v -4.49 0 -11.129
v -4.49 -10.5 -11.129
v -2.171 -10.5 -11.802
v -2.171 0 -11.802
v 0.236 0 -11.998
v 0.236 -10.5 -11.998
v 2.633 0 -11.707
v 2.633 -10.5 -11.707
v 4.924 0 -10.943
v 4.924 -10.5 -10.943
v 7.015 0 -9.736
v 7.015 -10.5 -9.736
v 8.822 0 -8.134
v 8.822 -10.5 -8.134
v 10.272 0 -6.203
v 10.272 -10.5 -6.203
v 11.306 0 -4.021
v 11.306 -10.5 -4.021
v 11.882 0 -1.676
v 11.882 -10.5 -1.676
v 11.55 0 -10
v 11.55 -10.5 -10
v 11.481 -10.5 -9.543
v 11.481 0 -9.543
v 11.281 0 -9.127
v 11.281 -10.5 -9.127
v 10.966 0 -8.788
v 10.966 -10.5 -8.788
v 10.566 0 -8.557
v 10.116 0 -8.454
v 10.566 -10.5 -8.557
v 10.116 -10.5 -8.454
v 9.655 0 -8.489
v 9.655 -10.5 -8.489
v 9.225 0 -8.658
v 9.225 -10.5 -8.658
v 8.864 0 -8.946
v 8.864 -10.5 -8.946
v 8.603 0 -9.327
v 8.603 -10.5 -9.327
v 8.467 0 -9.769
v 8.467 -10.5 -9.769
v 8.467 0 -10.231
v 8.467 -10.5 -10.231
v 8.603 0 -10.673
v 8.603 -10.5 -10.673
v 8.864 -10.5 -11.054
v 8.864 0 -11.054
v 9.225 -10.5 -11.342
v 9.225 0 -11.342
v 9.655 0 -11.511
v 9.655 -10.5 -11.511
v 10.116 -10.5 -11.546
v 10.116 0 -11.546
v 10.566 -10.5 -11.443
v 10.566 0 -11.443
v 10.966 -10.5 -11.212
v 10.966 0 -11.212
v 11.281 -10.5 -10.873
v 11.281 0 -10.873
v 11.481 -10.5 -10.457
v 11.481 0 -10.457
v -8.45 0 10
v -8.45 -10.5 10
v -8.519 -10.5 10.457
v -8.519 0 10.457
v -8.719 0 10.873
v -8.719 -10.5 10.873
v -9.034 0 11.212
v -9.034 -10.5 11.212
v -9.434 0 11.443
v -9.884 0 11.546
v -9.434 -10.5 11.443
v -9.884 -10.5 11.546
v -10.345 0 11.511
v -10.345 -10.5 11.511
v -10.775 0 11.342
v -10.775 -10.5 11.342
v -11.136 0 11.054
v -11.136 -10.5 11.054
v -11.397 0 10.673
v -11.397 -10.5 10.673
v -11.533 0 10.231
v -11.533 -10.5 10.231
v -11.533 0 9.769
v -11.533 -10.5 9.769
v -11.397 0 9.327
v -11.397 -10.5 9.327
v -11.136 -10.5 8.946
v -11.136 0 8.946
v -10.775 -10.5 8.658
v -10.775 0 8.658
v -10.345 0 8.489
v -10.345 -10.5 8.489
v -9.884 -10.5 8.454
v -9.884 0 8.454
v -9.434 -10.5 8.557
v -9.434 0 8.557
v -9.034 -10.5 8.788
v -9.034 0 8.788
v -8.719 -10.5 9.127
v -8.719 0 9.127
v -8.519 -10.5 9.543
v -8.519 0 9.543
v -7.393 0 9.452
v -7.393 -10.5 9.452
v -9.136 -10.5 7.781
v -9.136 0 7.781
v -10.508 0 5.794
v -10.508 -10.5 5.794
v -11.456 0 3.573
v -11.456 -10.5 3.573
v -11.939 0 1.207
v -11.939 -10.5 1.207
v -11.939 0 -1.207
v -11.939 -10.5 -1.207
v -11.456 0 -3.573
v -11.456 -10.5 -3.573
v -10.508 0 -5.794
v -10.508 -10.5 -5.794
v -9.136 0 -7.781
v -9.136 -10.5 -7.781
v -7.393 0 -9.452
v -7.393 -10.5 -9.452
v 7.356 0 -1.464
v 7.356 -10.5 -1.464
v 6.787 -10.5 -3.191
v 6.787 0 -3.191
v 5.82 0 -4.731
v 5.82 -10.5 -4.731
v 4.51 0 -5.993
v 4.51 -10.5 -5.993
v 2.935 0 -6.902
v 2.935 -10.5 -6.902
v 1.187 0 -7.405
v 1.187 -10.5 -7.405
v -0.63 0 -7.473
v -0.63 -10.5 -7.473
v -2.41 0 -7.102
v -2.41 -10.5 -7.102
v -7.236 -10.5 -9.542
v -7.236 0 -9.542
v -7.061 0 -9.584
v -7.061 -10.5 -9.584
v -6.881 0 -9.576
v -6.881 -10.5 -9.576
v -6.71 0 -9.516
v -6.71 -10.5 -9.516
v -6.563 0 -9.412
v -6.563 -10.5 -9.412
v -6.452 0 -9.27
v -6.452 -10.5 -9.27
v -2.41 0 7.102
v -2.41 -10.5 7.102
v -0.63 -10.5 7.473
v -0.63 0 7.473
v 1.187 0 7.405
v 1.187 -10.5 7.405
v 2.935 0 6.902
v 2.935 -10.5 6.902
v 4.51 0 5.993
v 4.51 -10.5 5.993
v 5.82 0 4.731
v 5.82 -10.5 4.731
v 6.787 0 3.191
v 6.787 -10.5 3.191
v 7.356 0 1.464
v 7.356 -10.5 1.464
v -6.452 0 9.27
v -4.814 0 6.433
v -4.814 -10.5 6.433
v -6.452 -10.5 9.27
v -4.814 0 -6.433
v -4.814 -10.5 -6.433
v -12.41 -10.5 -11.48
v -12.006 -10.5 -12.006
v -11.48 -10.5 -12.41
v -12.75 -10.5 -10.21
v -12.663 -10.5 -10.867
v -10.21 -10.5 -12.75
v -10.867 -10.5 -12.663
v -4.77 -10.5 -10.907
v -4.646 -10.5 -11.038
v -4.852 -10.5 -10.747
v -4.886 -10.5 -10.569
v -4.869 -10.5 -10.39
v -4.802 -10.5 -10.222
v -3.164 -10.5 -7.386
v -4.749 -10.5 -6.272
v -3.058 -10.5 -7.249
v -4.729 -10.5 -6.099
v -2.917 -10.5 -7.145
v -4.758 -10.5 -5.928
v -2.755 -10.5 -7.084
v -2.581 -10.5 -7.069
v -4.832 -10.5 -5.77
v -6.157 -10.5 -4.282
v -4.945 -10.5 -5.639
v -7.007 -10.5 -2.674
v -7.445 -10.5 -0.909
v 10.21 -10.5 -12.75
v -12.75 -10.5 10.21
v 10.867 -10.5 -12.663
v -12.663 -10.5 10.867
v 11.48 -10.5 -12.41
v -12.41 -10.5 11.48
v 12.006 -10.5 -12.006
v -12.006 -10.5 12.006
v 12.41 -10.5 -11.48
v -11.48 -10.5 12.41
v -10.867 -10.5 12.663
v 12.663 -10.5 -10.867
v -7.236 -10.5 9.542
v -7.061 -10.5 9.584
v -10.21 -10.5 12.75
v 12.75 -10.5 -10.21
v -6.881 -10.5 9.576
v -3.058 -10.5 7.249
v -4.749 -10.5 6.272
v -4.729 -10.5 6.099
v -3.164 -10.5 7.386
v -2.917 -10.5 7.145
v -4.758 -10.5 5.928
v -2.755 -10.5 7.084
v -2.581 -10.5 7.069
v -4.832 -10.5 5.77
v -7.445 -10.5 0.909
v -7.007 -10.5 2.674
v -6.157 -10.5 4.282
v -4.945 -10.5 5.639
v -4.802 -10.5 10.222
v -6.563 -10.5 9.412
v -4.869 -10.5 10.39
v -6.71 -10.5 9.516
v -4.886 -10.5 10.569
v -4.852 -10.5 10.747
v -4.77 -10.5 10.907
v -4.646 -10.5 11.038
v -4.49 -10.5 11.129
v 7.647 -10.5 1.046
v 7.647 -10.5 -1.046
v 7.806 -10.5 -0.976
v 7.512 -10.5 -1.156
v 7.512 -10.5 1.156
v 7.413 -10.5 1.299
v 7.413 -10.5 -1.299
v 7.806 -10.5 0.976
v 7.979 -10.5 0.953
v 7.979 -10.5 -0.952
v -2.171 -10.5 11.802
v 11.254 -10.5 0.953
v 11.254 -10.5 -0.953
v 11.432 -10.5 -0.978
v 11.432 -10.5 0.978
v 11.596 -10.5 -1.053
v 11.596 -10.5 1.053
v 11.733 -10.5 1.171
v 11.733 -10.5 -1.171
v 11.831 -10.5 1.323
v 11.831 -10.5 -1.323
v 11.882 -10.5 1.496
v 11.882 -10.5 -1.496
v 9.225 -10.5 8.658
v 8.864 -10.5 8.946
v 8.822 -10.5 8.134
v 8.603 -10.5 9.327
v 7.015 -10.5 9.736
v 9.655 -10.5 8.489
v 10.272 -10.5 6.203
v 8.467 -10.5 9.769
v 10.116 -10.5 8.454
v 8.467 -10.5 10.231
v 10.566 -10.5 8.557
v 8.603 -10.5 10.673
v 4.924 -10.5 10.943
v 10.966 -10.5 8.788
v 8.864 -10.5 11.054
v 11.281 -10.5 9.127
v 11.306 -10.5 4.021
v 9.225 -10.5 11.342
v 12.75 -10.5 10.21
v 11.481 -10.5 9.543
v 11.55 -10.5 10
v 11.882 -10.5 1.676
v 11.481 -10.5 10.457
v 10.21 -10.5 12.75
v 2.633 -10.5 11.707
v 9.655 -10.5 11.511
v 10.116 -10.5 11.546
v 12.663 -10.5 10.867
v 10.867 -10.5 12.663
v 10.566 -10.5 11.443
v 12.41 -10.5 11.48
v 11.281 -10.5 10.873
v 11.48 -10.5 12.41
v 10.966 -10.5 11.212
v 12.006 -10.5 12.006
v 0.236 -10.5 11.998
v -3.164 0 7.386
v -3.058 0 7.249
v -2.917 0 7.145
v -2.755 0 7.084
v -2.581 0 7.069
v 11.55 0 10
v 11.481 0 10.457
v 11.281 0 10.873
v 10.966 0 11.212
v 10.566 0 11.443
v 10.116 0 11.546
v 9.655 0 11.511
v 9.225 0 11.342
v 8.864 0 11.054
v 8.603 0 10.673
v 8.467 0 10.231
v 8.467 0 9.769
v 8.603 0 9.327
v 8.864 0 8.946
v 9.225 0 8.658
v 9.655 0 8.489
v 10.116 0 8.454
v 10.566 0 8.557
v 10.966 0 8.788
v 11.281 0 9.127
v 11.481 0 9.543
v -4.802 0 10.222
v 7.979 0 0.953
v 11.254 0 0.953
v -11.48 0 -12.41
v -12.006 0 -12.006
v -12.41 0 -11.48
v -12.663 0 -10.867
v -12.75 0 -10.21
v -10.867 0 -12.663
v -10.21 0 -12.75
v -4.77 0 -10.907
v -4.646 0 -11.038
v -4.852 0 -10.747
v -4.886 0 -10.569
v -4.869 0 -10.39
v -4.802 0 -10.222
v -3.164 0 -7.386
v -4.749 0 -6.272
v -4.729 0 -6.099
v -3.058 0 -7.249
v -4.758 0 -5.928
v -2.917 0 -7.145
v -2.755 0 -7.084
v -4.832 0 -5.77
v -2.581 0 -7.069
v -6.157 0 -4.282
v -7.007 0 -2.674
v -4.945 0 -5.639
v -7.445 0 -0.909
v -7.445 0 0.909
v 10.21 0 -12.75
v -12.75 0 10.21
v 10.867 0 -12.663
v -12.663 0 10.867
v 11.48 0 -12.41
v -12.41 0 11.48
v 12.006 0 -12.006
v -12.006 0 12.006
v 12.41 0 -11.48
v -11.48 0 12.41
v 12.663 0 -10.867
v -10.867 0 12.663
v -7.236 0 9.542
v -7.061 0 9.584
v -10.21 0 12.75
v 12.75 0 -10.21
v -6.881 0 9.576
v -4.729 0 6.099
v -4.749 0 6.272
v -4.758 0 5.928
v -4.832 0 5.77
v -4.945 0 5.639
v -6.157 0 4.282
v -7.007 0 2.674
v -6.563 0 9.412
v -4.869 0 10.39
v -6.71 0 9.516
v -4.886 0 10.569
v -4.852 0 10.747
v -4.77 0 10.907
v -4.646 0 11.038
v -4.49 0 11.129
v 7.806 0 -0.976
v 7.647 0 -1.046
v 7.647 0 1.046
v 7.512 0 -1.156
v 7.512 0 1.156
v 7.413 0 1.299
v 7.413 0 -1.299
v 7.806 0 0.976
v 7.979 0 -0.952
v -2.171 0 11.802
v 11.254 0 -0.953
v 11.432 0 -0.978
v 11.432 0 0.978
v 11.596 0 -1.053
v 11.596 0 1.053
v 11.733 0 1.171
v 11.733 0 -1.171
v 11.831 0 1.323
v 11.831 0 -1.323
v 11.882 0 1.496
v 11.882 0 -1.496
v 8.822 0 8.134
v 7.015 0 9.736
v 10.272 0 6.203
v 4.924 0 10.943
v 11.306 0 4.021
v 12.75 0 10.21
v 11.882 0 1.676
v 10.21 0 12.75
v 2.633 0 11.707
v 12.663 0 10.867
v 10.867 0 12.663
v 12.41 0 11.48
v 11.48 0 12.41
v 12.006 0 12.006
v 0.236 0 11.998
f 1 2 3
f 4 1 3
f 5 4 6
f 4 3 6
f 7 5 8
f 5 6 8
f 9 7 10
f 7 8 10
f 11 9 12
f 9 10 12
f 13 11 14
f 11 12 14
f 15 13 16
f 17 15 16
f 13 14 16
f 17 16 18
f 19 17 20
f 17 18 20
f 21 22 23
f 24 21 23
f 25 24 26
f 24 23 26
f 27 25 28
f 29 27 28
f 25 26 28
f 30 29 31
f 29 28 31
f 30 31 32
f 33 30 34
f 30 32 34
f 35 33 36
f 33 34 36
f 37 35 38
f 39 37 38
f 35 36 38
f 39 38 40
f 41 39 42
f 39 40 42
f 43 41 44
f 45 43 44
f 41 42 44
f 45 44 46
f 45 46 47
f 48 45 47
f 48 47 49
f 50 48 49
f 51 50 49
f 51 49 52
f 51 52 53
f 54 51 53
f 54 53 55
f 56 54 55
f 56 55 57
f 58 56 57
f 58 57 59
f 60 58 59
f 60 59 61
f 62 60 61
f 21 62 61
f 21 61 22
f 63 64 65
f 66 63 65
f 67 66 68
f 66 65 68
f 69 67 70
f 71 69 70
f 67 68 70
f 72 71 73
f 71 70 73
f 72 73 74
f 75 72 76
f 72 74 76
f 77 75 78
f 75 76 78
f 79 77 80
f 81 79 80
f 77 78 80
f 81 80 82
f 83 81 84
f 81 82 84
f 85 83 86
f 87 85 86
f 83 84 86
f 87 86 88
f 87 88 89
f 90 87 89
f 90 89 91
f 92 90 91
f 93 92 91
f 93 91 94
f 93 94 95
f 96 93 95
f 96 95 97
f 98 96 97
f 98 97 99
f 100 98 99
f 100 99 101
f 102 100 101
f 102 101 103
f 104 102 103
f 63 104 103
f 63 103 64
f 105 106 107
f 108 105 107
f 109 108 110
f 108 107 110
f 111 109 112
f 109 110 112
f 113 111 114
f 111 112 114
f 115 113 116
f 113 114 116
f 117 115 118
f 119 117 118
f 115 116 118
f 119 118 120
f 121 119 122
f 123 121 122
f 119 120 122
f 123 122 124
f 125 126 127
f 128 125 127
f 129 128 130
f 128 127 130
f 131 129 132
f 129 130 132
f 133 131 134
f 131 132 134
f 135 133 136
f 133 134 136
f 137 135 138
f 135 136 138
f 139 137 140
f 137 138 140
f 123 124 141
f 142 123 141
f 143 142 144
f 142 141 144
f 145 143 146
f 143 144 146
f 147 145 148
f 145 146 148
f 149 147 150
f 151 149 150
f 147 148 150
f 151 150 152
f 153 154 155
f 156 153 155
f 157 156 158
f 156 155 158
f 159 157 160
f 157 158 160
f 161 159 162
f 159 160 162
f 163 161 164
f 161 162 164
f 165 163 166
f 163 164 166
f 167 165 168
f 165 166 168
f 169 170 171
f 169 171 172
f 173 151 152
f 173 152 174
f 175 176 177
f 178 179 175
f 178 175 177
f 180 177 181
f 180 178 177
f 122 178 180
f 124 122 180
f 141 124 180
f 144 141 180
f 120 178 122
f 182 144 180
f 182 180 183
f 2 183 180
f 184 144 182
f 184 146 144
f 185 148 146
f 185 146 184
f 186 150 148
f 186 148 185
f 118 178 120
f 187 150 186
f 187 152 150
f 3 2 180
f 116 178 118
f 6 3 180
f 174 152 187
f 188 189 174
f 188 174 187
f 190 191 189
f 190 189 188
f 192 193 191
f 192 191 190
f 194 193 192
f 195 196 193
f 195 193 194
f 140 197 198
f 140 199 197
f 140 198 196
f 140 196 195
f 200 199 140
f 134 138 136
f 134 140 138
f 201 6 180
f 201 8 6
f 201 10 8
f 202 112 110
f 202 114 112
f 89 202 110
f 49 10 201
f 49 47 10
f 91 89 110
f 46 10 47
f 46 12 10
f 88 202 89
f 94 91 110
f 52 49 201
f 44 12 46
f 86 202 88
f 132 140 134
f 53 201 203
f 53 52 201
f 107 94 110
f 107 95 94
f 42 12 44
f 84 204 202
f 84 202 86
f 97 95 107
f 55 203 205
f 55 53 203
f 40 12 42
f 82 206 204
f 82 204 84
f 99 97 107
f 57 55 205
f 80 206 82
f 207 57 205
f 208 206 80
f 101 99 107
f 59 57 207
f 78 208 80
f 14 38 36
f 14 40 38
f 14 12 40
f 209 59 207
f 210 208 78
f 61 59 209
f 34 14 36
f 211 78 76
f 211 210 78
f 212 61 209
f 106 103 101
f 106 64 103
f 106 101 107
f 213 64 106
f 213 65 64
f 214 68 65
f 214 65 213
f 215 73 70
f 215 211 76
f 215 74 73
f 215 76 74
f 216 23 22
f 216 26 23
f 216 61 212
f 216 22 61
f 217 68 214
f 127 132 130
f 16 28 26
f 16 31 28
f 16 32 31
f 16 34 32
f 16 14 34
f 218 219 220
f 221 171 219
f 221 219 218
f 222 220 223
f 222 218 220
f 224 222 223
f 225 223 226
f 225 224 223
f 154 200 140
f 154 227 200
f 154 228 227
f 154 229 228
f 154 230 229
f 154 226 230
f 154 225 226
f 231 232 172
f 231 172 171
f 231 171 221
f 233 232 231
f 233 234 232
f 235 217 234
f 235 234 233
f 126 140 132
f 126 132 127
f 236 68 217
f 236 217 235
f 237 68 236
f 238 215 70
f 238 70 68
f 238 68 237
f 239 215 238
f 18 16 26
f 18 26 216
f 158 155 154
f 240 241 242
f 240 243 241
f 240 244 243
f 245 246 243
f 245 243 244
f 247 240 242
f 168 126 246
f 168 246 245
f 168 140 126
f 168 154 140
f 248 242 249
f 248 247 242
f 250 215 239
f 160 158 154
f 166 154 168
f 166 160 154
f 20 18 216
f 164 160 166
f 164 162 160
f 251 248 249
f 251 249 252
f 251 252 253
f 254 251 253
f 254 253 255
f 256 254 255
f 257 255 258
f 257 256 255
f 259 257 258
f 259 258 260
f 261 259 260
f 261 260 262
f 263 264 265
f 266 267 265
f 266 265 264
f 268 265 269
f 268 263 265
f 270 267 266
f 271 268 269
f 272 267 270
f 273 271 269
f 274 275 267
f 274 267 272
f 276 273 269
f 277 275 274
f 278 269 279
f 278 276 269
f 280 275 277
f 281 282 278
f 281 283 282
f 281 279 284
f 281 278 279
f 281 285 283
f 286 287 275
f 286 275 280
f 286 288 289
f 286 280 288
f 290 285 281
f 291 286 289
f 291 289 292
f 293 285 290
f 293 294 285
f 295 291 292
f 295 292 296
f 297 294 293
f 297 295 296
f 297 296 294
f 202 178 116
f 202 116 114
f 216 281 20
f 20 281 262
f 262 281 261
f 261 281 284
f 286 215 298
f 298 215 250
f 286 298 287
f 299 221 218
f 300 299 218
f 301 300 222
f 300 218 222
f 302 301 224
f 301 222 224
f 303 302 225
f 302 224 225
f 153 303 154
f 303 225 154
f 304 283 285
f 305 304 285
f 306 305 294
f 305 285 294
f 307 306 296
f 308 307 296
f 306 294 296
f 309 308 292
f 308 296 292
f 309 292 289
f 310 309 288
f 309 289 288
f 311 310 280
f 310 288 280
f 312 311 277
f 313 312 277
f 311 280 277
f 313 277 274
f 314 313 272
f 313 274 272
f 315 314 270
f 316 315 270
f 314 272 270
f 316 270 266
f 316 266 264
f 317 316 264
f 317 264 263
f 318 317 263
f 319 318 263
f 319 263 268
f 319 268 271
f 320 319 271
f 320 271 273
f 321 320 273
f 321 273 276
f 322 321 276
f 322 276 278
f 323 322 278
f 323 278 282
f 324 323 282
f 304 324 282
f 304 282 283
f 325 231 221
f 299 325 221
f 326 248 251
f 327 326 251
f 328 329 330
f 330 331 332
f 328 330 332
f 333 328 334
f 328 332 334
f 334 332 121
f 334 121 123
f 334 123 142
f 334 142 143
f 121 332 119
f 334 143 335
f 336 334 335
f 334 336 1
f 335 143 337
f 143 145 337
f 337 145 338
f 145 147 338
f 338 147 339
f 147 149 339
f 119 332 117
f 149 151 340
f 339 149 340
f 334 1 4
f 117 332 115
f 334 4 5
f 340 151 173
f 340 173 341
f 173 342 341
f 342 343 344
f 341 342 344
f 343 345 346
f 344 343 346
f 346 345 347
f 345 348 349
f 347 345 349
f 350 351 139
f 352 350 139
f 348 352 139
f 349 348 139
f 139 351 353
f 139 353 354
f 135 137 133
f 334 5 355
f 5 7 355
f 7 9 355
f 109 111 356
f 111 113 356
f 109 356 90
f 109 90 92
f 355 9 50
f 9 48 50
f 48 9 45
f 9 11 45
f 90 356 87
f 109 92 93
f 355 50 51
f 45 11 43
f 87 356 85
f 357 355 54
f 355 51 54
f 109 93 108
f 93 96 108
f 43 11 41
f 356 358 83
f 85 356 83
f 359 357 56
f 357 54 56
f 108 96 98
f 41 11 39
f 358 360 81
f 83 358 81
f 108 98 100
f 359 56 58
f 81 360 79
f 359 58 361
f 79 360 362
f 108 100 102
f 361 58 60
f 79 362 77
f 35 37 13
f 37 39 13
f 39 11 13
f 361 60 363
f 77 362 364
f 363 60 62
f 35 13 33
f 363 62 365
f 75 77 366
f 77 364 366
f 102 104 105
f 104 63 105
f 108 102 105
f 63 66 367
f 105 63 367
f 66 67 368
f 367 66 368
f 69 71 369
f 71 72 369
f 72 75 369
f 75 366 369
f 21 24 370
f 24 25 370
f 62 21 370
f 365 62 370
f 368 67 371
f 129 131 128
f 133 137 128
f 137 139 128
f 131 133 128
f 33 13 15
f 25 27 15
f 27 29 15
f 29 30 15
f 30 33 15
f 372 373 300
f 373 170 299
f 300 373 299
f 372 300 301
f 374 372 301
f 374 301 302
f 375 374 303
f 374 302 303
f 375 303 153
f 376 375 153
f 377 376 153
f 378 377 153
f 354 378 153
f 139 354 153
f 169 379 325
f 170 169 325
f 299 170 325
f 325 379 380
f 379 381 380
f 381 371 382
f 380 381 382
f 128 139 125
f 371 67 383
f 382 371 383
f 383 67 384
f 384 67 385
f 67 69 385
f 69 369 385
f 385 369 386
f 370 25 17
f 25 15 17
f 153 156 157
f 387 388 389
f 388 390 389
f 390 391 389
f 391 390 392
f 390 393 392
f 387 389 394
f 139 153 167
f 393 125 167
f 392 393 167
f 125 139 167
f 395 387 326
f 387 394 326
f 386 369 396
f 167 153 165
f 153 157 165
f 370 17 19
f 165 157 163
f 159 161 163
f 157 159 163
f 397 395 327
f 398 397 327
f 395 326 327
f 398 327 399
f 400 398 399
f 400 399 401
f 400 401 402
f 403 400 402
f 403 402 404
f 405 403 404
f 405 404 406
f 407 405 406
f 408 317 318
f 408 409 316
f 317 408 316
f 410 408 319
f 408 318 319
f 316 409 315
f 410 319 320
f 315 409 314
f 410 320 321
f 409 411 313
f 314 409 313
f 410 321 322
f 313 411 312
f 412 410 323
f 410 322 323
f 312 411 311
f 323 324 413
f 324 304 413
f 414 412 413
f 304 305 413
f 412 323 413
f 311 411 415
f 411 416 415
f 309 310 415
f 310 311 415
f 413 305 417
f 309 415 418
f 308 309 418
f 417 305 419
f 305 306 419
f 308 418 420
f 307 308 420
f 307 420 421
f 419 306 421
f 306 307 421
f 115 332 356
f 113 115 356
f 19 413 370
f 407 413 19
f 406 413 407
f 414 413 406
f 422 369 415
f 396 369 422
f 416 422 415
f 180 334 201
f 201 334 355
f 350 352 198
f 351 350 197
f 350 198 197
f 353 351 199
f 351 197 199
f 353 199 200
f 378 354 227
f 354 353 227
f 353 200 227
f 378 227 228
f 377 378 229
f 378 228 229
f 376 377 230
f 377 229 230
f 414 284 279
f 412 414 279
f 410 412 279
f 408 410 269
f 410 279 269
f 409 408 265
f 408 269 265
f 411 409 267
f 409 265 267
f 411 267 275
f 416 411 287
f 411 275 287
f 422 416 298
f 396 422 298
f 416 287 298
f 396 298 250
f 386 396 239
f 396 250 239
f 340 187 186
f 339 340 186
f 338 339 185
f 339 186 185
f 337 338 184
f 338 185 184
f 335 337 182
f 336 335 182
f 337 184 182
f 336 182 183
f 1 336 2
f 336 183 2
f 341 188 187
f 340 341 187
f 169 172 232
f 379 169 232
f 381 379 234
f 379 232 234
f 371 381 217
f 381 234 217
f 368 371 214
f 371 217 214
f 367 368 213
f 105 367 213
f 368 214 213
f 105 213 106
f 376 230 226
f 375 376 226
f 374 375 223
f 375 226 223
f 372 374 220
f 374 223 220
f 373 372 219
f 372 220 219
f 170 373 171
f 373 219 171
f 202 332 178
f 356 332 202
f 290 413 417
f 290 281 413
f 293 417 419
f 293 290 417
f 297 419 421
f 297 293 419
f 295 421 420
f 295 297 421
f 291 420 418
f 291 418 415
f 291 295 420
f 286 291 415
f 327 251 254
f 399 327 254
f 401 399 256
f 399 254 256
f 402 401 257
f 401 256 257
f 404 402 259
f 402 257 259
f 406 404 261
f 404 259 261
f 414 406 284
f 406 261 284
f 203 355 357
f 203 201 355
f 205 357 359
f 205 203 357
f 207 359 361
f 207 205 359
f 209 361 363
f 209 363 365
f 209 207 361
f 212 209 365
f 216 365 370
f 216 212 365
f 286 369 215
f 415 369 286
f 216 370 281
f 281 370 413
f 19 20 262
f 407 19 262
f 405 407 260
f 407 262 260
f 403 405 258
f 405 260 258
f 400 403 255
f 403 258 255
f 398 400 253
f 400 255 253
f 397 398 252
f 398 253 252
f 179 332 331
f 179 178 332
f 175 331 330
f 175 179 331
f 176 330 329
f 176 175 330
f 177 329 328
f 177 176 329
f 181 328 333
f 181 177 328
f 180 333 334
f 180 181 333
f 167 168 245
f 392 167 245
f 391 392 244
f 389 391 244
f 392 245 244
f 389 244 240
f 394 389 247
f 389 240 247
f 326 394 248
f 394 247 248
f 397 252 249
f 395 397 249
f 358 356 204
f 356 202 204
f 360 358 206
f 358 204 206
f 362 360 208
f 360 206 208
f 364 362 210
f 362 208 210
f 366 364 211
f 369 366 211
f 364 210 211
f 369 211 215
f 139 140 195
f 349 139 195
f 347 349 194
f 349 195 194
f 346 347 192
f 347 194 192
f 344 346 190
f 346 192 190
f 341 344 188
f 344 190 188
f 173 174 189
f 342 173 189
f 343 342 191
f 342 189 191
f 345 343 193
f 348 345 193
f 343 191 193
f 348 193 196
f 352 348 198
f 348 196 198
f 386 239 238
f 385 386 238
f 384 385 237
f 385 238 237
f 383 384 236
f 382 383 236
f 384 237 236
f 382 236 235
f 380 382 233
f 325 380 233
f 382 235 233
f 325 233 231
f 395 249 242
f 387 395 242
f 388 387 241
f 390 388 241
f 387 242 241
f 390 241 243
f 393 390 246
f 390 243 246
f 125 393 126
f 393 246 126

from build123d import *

# Parameters (mm, degrees)
F0_W     = 25.5
F0_H     = 25.5
F1_DEPTH = 10.5
F2_R     = 2.54
F3_R     = 1.55
F4_DEPTH = 10.501


with BuildPart() as f1:
    # F0 (on Front) → F1 (new body)
    with BuildSketch(Plane.XZ):
        Rectangle(F0_W, F0_H)
    extrude(amount=F1_DEPTH)

    # F2
    f2_edges = [f1.edges().sort_by_distance(p)[0] for p in [
        (12.75, -5.25, 12.75),
        (-12.75, -5.25, 12.75),
        (12.75, -5.25, -12.75),
        (-12.75, -5.25, -12.75),
    ]]
    fillet(f2_edges, radius=F2_R)

    # F3 (on face) → F4 (cut, through all)
    with BuildSketch(Plane.XZ.offset(10.5)):
        with Locations((-10, 10)):
            Circle(F3_R)
        with Locations((10, 10)):
            Circle(F3_R)
        with Locations((10, -10)):
            Circle(F3_R)
        with BuildLine():
            ThreePointArc((-4.945405, -5.638526), (-7.5, 0), (-4.945405, 5.638526))
            ThreePointArc((-4.945405, 5.638526), (-4.737594, 6.0125), (-4.81419, 6.433421))
            Line((-4.81419, 6.433421), (-6.451679, 9.269636))
            ThreePointArc((-6.451679, 9.269636), (-6.880602, 9.575501), (-7.392808, 9.452322))
            ThreePointArc((-7.392808, 9.452322), (-12, 0), (-7.392808, -9.452322))
            ThreePointArc((-7.392808, -9.452322), (-6.880602, -9.575501), (-6.451679, -9.269636))
            Line((-6.451679, -9.269636), (-4.81419, -6.433421))
            ThreePointArc((-4.81419, -6.433421), (-4.737594, -6.0125), (-4.945405, -5.638526))
        make_face()
        with BuildLine():
            Line((-4.801901, 10.222136), (-3.164411, 7.385921))
            ThreePointArc((-3.164411, 7.385921), (-2.83818, 7.109127), (-2.410404, 7.102109))
            ThreePointArc((-2.410404, 7.102109), (3.75, 6.495191), (7.355809, 1.463583))
            ThreePointArc((7.355809, 1.463583), (7.575774, 1.096627), (7.978601, 0.9525))
            Line((7.978601, 0.9525), (11.25358, 0.9525))
            ThreePointArc((11.25358, 0.9525), (11.732928, 1.171026), (11.882355, 1.676199))
            ThreePointArc((11.882355, 1.676199), (6, 10.392305), (-4.489547, 11.128521))
            ThreePointArc((-4.489547, 11.128521), (-4.852326, 10.746527), (-4.801901, 10.222136))
        make_face()
        with BuildLine():
            Line((11.25358, -0.9525), (7.978601, -0.9525))
            ThreePointArc((7.978601, -0.9525), (7.575774, -1.096627), (7.355809, -1.463583))
            ThreePointArc((7.355809, -1.463583), (3.75, -6.495191), (-2.410404, -7.102109))
            ThreePointArc((-2.410404, -7.102109), (-2.83818, -7.109127), (-3.164411, -7.385921))
            Line((-3.164411, -7.385921), (-4.801901, -10.222136))
            ThreePointArc((-4.801901, -10.222136), (-4.852326, -10.746527), (-4.489547, -11.128521))
            ThreePointArc((-4.489547, -11.128521), (6, -10.392305), (11.882355, -1.676199))
            ThreePointArc((11.882355, -1.676199), (11.732928, -1.171026), (11.25358, -0.9525))
        make_face()
    extrude(amount=-F4_DEPTH, mode=Mode.SUBTRACT)


solid = f1.part
